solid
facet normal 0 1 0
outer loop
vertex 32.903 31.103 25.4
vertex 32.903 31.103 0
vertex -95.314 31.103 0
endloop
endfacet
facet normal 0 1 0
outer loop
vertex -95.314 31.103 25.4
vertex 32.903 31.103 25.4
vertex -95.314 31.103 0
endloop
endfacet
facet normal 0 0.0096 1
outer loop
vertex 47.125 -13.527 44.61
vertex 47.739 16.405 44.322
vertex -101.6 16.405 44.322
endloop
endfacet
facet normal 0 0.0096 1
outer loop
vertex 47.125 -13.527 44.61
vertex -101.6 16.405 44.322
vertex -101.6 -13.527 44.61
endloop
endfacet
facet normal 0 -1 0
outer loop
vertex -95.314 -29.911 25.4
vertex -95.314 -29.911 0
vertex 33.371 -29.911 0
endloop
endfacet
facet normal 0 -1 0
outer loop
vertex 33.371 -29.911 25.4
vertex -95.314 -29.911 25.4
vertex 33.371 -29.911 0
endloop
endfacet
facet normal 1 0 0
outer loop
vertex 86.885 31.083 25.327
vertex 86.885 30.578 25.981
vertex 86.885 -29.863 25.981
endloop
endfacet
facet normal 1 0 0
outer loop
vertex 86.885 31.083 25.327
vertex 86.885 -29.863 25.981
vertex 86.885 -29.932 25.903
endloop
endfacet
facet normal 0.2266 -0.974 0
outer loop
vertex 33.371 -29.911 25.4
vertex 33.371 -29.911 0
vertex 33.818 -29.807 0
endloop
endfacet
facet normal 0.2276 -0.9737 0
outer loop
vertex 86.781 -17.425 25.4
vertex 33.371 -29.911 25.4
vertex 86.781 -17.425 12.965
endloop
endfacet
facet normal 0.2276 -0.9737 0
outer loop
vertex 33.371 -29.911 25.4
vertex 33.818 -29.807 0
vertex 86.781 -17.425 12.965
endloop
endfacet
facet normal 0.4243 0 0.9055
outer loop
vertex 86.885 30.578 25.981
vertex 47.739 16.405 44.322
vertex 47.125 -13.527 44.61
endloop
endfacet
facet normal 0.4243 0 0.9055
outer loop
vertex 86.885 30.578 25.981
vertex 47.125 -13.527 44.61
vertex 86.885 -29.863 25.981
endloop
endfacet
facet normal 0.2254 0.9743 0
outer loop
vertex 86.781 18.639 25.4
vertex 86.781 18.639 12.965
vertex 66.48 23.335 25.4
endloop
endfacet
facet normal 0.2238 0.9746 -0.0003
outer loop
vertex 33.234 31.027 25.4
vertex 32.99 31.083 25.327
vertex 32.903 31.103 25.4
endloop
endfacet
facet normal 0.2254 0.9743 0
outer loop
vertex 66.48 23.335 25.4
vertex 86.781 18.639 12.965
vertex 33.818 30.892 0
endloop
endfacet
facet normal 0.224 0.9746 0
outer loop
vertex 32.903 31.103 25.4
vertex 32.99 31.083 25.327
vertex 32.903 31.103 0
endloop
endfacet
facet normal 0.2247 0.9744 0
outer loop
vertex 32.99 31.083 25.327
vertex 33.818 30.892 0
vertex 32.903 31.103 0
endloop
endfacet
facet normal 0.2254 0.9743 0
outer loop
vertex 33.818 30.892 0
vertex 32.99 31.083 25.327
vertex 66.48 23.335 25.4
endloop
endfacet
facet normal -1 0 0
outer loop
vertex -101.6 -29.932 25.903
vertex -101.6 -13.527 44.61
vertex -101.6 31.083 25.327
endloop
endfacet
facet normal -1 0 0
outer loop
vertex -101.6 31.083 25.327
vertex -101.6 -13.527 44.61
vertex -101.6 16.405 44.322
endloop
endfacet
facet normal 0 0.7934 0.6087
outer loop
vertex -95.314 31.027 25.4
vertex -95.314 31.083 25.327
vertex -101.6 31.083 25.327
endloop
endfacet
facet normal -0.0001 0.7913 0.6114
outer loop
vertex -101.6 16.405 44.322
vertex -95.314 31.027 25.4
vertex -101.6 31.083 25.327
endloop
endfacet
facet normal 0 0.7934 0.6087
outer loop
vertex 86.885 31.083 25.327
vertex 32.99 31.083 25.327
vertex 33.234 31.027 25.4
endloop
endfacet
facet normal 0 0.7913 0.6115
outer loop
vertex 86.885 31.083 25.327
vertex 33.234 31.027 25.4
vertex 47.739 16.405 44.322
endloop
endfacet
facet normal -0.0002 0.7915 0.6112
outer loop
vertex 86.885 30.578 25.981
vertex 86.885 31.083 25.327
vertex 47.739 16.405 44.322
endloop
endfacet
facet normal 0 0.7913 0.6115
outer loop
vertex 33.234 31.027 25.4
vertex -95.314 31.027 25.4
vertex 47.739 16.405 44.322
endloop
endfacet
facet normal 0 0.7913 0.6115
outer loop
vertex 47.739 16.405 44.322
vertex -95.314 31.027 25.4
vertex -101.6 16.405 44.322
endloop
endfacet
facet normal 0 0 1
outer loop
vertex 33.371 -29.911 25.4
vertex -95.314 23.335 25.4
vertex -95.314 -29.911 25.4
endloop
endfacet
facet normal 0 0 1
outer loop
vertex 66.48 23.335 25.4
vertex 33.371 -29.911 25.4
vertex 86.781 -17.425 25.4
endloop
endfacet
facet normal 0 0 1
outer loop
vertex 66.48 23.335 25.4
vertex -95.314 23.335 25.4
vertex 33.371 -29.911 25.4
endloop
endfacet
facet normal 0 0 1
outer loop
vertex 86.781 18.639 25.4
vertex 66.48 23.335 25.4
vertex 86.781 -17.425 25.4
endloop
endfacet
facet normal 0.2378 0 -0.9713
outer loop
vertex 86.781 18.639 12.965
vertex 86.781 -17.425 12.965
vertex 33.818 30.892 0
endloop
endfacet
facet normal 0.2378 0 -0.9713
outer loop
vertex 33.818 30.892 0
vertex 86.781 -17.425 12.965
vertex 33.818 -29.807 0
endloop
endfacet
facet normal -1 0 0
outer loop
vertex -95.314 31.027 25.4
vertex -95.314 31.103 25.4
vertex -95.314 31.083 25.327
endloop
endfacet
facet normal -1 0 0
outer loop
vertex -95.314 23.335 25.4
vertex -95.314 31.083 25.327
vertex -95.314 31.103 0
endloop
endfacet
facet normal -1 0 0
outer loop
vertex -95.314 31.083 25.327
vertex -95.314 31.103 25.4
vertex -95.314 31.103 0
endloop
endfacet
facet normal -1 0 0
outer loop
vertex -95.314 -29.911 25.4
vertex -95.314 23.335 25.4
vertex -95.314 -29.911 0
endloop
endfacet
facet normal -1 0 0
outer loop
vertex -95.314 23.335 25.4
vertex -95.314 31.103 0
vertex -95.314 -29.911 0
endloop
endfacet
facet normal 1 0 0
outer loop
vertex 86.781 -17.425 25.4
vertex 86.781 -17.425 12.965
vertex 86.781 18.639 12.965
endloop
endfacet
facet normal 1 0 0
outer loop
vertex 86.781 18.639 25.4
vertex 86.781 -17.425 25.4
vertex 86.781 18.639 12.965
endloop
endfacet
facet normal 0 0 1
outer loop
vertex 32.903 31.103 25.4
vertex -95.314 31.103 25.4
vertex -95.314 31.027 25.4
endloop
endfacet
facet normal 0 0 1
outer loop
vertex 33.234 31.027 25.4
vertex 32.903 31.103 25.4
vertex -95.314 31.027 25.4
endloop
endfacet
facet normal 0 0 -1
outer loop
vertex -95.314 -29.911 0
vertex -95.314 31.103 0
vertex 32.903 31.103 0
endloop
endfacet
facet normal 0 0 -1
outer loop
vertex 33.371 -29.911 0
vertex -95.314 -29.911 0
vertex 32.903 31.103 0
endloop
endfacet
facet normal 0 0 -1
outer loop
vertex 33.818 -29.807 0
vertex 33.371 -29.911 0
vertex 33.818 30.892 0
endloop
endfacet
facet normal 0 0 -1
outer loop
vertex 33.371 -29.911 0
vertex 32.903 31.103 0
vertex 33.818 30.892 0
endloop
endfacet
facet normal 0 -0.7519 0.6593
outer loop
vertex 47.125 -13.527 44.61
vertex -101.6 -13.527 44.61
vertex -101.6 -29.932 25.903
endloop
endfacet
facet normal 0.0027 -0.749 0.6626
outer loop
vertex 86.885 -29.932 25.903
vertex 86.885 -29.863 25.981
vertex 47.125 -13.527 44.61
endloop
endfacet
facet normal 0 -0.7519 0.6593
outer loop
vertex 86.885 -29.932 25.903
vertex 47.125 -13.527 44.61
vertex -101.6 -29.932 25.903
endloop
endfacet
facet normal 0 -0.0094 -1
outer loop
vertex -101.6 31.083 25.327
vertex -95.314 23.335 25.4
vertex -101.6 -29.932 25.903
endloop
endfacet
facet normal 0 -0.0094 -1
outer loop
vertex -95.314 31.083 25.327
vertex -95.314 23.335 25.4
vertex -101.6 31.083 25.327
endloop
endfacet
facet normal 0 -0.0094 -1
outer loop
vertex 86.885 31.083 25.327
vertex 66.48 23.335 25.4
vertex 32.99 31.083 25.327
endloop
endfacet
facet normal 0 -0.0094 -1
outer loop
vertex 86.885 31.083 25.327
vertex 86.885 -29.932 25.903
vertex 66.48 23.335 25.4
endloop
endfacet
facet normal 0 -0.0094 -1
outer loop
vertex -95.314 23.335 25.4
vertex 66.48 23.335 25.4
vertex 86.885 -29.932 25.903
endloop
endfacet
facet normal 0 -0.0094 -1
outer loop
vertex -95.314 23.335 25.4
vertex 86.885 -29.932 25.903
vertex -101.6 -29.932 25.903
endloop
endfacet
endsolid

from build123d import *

# Parameters (mm, degrees)
F1_DEPTH = 25.4
F3_DEPTH = 101.6
F5_DEPTH = 127


with BuildPart() as f1:
    # F0 (on Top) → F1 (new body)
    with BuildSketch(Plane.XY):
        Polygon((32.903377, 31.103013), (-95.314093, 31.103013), (-95.314093, -29.911235), (33.370786, -29.911235), (86.780615, -17.424744), (86.780615, 18.638877), align=None)
    extrude(amount=F1_DEPTH)

    # F2 (on Right) → F3 (join, symmetric)
    with BuildSketch(Plane.YZ):
        Polygon((-13.52687, 44.609893), (-29.9318, 25.902519), (31.083023, 25.326908), (16.404927, 44.322085), align=None)
    extrude(amount=F3_DEPTH, both=True)

    # F4 (on Front) → F5 (cut, symmetric)
    with BuildSketch(Plane.XZ):
        Polygon((33.817593, 0), (86.885192, 0), (110.29736, 0), (110.29736, 60.351387), (87.925732, 60.351387), (13.527044, 60.351387), (86.885192, 25.980785), (86.885192, 12.990392), align=None)
    extrude(amount=F5_DEPTH, both=True, mode=Mode.SUBTRACT)


solid = f1.part
